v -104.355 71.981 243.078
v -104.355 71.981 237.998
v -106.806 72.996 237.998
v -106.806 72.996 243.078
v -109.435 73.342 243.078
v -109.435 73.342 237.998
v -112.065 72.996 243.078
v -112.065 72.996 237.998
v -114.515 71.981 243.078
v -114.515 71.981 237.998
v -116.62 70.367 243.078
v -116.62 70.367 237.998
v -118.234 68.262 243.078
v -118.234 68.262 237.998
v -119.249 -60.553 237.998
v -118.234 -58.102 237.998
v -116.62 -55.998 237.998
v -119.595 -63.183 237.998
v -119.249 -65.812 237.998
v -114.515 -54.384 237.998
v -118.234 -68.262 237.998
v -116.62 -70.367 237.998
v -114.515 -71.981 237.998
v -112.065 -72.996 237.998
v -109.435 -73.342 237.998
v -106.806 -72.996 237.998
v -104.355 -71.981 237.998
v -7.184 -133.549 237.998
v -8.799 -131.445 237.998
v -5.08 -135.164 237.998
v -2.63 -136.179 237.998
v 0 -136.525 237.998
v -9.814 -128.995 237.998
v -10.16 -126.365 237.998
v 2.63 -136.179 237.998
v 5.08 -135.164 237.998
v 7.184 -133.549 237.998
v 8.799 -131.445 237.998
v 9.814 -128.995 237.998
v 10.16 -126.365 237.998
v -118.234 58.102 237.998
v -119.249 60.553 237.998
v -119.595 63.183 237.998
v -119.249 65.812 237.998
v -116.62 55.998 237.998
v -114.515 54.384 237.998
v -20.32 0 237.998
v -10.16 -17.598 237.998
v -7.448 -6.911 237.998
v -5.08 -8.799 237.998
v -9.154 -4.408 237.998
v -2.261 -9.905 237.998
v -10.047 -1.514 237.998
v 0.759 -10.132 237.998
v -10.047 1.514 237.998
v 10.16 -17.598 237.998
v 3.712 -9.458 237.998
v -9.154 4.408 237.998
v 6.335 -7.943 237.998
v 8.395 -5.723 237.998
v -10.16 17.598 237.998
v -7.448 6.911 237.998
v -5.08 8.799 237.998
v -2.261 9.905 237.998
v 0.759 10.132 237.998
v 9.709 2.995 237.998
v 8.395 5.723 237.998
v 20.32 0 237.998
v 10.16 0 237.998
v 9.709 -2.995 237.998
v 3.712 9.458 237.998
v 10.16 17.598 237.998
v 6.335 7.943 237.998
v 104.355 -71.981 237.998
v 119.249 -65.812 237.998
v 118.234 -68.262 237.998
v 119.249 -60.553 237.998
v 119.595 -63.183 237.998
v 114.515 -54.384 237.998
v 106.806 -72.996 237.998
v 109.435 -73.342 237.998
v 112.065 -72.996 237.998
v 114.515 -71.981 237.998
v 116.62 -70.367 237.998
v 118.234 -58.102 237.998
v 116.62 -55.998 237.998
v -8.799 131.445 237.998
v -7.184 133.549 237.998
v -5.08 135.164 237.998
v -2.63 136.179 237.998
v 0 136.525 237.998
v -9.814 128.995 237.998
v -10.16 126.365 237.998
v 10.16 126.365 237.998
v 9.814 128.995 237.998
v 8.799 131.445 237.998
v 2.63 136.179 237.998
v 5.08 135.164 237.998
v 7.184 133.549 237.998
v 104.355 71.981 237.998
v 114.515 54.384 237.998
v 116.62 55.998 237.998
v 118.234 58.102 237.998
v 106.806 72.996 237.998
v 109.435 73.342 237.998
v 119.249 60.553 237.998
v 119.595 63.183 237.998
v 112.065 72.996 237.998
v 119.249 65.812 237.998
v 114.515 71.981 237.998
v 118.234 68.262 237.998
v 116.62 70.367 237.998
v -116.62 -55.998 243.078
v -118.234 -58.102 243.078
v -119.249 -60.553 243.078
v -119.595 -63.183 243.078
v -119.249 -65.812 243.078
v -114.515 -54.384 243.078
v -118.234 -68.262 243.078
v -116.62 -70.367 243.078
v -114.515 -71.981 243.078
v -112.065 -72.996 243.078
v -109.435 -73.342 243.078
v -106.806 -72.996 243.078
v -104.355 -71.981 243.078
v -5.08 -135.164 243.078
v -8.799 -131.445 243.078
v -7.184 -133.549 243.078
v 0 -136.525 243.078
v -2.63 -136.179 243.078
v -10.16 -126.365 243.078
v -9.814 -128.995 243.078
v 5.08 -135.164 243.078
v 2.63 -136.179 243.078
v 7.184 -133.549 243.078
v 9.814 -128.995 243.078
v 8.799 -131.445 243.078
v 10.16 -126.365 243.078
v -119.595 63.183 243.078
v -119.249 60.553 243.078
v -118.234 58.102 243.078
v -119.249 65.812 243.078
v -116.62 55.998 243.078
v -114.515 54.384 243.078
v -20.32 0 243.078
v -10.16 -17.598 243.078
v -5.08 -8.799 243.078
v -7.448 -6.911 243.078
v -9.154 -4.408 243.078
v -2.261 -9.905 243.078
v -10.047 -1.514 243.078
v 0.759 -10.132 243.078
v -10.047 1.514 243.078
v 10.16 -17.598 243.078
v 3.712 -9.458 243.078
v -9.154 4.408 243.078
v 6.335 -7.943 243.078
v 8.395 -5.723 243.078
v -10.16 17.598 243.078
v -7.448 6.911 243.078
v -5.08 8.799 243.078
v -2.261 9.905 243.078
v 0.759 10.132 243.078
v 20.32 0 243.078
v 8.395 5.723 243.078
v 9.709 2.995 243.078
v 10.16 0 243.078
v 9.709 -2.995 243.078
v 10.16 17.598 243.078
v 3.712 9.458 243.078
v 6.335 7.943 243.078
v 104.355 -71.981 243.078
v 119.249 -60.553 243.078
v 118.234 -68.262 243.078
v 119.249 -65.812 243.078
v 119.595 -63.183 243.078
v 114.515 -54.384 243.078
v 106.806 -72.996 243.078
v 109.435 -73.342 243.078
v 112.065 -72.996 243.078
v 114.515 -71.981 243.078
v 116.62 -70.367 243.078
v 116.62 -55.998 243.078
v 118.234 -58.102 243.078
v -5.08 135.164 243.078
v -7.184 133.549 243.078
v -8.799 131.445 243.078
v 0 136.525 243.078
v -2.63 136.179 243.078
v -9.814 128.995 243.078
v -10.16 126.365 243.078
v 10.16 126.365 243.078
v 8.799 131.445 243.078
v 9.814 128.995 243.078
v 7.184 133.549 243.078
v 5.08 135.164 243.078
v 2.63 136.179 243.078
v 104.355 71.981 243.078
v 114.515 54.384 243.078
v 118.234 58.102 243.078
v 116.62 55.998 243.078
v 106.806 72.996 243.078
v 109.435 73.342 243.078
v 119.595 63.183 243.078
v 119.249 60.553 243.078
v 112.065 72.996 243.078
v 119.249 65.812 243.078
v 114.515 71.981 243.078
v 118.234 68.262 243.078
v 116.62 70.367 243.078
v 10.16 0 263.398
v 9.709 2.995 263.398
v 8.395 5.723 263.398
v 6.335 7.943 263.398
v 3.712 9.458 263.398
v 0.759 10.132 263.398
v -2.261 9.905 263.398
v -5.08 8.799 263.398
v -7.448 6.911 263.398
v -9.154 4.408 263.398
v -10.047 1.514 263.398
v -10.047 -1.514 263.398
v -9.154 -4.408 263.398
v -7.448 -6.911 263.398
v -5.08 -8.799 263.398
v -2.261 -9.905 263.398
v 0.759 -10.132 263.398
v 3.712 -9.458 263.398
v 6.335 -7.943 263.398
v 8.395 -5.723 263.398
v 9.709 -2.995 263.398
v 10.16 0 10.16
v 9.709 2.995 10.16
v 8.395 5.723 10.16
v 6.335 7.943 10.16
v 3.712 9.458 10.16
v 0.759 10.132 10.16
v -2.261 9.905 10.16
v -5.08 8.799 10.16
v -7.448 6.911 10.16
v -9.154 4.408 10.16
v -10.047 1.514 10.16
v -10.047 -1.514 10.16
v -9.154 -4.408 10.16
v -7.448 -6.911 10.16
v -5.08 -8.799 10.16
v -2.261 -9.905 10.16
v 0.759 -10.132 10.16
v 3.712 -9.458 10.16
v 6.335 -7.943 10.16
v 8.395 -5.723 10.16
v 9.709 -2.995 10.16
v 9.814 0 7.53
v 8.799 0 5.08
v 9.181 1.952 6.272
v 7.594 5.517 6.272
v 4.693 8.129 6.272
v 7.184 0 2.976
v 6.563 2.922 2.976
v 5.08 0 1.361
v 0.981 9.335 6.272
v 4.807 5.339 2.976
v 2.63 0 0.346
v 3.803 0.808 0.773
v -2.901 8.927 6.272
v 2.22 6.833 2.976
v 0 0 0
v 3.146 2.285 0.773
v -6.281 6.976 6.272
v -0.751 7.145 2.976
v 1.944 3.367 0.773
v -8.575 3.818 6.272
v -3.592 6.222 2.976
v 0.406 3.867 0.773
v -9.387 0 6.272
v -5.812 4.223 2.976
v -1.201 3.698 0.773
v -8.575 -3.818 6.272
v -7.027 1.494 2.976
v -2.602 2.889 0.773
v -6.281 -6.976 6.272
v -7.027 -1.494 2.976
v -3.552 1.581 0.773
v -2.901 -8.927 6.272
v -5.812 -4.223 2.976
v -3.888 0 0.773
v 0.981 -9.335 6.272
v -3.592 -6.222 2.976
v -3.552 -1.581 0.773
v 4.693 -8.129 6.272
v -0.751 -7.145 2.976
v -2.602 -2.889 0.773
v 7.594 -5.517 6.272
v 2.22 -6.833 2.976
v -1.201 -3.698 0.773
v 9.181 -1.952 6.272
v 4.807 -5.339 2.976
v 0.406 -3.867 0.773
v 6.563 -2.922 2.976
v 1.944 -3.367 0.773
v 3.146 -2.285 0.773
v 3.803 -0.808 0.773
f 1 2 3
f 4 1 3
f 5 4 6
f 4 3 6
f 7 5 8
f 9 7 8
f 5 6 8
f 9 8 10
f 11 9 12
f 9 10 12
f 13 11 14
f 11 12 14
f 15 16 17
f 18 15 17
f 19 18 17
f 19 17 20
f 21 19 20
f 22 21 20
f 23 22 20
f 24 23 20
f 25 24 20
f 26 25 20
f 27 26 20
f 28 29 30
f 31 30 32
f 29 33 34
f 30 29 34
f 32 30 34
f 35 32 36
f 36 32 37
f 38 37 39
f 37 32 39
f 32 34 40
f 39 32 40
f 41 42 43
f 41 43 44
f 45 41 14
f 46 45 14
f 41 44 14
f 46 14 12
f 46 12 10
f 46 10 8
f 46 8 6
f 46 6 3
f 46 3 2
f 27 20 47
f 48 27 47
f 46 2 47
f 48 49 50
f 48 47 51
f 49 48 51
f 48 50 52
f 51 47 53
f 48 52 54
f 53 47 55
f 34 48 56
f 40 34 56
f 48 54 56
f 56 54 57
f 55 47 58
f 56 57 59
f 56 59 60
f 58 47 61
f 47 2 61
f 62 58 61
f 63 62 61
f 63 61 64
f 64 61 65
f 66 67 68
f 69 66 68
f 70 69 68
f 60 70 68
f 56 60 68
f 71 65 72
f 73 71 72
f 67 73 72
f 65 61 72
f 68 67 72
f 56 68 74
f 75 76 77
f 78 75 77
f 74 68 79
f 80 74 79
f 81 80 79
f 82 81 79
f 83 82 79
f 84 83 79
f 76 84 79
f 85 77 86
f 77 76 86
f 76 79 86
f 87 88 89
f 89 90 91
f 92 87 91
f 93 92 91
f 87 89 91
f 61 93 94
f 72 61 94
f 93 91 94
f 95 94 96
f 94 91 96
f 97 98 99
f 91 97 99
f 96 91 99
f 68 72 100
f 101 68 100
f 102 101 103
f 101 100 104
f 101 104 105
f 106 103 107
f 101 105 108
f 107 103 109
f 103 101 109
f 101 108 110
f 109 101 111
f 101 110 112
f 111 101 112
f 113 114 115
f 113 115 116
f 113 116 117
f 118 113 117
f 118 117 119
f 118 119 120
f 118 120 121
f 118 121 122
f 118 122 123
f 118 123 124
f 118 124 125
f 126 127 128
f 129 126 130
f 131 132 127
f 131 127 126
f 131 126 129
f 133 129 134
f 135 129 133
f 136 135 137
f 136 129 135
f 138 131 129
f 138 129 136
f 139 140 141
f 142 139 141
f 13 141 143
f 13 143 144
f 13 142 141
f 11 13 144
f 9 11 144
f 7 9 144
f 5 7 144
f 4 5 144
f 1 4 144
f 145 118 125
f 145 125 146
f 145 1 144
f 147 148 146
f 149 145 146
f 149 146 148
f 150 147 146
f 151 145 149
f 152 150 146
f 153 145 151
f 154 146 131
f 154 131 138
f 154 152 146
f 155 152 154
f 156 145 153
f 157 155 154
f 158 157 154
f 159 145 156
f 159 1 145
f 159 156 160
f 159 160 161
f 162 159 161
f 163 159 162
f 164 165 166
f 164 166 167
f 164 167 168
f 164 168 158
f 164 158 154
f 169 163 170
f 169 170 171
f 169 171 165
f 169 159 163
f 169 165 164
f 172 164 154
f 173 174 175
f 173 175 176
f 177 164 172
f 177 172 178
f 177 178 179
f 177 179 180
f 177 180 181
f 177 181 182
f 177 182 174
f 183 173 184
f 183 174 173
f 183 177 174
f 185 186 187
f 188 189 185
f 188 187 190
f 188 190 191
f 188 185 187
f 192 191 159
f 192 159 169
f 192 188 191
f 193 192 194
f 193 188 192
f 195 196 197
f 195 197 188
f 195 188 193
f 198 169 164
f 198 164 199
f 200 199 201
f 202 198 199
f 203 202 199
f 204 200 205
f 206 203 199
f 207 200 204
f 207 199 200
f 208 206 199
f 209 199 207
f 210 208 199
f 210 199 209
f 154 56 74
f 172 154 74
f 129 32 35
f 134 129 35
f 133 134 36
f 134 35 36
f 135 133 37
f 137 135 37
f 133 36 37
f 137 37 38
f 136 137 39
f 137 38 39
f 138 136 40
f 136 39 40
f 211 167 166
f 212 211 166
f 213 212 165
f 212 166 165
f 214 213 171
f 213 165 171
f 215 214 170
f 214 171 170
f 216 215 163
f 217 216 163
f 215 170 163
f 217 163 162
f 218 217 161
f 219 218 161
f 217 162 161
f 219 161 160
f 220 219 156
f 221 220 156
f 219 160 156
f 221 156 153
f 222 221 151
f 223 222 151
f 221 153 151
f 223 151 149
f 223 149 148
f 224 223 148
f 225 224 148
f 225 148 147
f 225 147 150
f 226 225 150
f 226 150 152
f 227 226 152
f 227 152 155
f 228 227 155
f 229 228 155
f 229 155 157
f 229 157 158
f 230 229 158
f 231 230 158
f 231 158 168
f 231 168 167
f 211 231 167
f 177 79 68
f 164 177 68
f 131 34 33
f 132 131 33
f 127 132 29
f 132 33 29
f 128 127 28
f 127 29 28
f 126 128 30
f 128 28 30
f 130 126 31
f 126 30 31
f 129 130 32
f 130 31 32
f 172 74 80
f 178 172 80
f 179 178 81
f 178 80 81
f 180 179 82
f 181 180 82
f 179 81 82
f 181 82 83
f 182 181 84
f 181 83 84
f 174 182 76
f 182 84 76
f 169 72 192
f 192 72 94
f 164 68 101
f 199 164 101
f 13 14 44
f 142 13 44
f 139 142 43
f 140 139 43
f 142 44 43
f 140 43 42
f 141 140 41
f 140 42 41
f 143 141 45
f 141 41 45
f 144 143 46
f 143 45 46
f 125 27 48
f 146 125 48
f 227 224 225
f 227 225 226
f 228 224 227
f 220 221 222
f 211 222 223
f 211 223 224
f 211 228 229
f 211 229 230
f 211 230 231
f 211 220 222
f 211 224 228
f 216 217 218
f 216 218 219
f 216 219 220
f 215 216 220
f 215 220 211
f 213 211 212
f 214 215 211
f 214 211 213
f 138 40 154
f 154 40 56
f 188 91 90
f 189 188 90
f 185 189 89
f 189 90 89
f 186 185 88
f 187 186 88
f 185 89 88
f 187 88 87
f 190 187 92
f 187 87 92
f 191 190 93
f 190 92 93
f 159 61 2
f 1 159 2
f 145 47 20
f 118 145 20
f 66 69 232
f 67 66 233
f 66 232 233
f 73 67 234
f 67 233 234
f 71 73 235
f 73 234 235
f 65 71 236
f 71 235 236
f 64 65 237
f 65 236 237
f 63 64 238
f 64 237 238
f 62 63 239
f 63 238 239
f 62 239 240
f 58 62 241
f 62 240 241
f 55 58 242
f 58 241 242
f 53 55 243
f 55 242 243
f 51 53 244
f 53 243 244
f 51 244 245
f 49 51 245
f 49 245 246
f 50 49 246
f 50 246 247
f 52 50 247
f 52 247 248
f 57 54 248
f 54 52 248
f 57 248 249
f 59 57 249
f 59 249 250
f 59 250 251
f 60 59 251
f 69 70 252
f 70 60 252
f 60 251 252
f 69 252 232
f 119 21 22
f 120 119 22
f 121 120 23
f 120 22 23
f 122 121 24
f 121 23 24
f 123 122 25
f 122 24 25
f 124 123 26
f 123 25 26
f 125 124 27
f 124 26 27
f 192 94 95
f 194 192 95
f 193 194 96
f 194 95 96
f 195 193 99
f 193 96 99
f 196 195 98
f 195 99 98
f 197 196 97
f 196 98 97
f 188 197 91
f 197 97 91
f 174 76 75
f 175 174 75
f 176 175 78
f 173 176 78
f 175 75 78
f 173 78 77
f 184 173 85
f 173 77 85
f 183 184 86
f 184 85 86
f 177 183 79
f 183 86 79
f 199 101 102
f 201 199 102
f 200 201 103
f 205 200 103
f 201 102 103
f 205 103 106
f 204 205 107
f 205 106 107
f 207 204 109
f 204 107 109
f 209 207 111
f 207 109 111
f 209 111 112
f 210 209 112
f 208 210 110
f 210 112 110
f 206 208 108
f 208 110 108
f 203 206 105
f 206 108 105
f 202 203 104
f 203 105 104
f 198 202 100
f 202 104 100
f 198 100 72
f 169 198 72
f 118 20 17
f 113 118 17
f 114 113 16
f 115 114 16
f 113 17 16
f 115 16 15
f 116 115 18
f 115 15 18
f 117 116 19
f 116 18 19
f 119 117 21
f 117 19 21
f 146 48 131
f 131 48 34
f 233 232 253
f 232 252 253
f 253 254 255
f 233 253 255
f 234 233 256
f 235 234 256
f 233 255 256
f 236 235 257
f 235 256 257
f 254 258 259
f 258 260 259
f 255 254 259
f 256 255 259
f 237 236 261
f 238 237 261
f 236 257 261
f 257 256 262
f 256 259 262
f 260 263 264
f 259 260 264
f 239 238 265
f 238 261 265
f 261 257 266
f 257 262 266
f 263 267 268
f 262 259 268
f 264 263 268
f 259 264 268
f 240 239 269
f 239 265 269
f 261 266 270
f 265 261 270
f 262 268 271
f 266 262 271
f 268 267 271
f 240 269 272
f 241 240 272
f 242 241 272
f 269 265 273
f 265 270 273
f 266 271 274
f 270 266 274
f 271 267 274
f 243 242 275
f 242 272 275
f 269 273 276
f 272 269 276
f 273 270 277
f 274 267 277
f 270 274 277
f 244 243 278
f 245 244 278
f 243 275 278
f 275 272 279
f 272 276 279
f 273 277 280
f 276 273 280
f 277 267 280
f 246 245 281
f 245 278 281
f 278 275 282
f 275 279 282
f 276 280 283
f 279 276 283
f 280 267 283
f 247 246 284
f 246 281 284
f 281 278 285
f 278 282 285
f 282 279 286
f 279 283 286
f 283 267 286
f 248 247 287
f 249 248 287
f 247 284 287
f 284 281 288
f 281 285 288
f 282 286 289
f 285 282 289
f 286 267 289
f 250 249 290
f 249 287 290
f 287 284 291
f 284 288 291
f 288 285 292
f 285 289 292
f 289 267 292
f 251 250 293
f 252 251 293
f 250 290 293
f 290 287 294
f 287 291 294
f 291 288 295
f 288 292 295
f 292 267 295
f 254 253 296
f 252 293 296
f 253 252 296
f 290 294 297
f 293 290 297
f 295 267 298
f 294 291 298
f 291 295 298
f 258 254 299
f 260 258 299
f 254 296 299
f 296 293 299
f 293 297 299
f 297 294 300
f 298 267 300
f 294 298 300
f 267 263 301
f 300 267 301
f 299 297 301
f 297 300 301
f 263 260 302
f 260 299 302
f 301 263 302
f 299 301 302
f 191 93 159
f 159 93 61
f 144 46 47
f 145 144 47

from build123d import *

# Parameters (mm, degrees)
F0_R     = 10.16
F1_DEPTH = 263.398
F4_DEPTH = 5.08
F5_R     = 10.16


with BuildPart() as f1:
    # F0 (on Top) → F1 (new body)
    with BuildSketch(Plane.XY):
        Circle(F0_R)
    extrude(amount=F1_DEPTH)

    # F3 (on offset) → F4 (join)
    with BuildSketch(Plane.XY.offset(237.998)):
        with BuildLine():
            ThreePointArc((0, 136.525), (-7.184205, 133.549205), (-10.16, 126.365))
            Line((-10.16, 126.365), (-10.16, 17.597636))
            Line((-10.16, 17.597636), (-104.3553, 71.981318))
            ThreePointArc((-104.3553, 71.981318), (-112.064902, 72.996306), (-118.234118, 68.2625))
            ThreePointArc((-118.234118, 68.2625), (-119.249107, 60.552899), (-114.5153, 54.383682))
            Line((-114.5153, 54.383682), (-20.32, 0))
            Line((-20.32, 0), (-114.5153, -54.383682))
            ThreePointArc((-114.5153, -54.383682), (-119.249107, -60.552899), (-118.234118, -68.2625))
            ThreePointArc((-118.234118, -68.2625), (-112.064902, -72.996306), (-104.3553, -71.981318))
            Line((-104.3553, -71.981318), (-10.16, -17.597636))
            Line((-10.16, -17.597636), (-10.16, -126.365))
            ThreePointArc((-10.16, -126.365), (-7.184205, -133.549205), (0, -136.525))
            ThreePointArc((0, -136.525), (7.184205, -133.549205), (10.16, -126.365))
            Line((10.16, -126.365), (10.16, -17.597636))
            Line((10.16, -17.597636), (104.3553, -71.981318))
            ThreePointArc((104.3553, -71.981318), (112.064902, -72.996306), (118.234118, -68.2625))
            ThreePointArc((118.234118, -68.2625), (119.249107, -60.552899), (114.5153, -54.383682))
            Line((114.5153, -54.383682), (20.32, 0))
            Line((20.32, 0), (114.5153, 54.383682))
            ThreePointArc((114.5153, 54.383682), (119.249107, 60.552899), (118.234118, 68.2625))
            ThreePointArc((118.234118, 68.2625), (112.064902, 72.996306), (104.3553, 71.981318))
            Line((104.3553, 71.981318), (10.16, 17.597636))
            Line((10.16, 17.597636), (10.16, 126.365))
            ThreePointArc((10.16, 126.365), (7.184205, 133.549205), (0, 136.525))
        make_face()
    extrude(amount=F4_DEPTH)

    # F5
    f5_edges = [f1.edges().sort_by_distance(p)[0] for p in [
        (-10.16, 0, 0),
    ]]
    fillet(f5_edges, radius=F5_R)


solid = f1.part
